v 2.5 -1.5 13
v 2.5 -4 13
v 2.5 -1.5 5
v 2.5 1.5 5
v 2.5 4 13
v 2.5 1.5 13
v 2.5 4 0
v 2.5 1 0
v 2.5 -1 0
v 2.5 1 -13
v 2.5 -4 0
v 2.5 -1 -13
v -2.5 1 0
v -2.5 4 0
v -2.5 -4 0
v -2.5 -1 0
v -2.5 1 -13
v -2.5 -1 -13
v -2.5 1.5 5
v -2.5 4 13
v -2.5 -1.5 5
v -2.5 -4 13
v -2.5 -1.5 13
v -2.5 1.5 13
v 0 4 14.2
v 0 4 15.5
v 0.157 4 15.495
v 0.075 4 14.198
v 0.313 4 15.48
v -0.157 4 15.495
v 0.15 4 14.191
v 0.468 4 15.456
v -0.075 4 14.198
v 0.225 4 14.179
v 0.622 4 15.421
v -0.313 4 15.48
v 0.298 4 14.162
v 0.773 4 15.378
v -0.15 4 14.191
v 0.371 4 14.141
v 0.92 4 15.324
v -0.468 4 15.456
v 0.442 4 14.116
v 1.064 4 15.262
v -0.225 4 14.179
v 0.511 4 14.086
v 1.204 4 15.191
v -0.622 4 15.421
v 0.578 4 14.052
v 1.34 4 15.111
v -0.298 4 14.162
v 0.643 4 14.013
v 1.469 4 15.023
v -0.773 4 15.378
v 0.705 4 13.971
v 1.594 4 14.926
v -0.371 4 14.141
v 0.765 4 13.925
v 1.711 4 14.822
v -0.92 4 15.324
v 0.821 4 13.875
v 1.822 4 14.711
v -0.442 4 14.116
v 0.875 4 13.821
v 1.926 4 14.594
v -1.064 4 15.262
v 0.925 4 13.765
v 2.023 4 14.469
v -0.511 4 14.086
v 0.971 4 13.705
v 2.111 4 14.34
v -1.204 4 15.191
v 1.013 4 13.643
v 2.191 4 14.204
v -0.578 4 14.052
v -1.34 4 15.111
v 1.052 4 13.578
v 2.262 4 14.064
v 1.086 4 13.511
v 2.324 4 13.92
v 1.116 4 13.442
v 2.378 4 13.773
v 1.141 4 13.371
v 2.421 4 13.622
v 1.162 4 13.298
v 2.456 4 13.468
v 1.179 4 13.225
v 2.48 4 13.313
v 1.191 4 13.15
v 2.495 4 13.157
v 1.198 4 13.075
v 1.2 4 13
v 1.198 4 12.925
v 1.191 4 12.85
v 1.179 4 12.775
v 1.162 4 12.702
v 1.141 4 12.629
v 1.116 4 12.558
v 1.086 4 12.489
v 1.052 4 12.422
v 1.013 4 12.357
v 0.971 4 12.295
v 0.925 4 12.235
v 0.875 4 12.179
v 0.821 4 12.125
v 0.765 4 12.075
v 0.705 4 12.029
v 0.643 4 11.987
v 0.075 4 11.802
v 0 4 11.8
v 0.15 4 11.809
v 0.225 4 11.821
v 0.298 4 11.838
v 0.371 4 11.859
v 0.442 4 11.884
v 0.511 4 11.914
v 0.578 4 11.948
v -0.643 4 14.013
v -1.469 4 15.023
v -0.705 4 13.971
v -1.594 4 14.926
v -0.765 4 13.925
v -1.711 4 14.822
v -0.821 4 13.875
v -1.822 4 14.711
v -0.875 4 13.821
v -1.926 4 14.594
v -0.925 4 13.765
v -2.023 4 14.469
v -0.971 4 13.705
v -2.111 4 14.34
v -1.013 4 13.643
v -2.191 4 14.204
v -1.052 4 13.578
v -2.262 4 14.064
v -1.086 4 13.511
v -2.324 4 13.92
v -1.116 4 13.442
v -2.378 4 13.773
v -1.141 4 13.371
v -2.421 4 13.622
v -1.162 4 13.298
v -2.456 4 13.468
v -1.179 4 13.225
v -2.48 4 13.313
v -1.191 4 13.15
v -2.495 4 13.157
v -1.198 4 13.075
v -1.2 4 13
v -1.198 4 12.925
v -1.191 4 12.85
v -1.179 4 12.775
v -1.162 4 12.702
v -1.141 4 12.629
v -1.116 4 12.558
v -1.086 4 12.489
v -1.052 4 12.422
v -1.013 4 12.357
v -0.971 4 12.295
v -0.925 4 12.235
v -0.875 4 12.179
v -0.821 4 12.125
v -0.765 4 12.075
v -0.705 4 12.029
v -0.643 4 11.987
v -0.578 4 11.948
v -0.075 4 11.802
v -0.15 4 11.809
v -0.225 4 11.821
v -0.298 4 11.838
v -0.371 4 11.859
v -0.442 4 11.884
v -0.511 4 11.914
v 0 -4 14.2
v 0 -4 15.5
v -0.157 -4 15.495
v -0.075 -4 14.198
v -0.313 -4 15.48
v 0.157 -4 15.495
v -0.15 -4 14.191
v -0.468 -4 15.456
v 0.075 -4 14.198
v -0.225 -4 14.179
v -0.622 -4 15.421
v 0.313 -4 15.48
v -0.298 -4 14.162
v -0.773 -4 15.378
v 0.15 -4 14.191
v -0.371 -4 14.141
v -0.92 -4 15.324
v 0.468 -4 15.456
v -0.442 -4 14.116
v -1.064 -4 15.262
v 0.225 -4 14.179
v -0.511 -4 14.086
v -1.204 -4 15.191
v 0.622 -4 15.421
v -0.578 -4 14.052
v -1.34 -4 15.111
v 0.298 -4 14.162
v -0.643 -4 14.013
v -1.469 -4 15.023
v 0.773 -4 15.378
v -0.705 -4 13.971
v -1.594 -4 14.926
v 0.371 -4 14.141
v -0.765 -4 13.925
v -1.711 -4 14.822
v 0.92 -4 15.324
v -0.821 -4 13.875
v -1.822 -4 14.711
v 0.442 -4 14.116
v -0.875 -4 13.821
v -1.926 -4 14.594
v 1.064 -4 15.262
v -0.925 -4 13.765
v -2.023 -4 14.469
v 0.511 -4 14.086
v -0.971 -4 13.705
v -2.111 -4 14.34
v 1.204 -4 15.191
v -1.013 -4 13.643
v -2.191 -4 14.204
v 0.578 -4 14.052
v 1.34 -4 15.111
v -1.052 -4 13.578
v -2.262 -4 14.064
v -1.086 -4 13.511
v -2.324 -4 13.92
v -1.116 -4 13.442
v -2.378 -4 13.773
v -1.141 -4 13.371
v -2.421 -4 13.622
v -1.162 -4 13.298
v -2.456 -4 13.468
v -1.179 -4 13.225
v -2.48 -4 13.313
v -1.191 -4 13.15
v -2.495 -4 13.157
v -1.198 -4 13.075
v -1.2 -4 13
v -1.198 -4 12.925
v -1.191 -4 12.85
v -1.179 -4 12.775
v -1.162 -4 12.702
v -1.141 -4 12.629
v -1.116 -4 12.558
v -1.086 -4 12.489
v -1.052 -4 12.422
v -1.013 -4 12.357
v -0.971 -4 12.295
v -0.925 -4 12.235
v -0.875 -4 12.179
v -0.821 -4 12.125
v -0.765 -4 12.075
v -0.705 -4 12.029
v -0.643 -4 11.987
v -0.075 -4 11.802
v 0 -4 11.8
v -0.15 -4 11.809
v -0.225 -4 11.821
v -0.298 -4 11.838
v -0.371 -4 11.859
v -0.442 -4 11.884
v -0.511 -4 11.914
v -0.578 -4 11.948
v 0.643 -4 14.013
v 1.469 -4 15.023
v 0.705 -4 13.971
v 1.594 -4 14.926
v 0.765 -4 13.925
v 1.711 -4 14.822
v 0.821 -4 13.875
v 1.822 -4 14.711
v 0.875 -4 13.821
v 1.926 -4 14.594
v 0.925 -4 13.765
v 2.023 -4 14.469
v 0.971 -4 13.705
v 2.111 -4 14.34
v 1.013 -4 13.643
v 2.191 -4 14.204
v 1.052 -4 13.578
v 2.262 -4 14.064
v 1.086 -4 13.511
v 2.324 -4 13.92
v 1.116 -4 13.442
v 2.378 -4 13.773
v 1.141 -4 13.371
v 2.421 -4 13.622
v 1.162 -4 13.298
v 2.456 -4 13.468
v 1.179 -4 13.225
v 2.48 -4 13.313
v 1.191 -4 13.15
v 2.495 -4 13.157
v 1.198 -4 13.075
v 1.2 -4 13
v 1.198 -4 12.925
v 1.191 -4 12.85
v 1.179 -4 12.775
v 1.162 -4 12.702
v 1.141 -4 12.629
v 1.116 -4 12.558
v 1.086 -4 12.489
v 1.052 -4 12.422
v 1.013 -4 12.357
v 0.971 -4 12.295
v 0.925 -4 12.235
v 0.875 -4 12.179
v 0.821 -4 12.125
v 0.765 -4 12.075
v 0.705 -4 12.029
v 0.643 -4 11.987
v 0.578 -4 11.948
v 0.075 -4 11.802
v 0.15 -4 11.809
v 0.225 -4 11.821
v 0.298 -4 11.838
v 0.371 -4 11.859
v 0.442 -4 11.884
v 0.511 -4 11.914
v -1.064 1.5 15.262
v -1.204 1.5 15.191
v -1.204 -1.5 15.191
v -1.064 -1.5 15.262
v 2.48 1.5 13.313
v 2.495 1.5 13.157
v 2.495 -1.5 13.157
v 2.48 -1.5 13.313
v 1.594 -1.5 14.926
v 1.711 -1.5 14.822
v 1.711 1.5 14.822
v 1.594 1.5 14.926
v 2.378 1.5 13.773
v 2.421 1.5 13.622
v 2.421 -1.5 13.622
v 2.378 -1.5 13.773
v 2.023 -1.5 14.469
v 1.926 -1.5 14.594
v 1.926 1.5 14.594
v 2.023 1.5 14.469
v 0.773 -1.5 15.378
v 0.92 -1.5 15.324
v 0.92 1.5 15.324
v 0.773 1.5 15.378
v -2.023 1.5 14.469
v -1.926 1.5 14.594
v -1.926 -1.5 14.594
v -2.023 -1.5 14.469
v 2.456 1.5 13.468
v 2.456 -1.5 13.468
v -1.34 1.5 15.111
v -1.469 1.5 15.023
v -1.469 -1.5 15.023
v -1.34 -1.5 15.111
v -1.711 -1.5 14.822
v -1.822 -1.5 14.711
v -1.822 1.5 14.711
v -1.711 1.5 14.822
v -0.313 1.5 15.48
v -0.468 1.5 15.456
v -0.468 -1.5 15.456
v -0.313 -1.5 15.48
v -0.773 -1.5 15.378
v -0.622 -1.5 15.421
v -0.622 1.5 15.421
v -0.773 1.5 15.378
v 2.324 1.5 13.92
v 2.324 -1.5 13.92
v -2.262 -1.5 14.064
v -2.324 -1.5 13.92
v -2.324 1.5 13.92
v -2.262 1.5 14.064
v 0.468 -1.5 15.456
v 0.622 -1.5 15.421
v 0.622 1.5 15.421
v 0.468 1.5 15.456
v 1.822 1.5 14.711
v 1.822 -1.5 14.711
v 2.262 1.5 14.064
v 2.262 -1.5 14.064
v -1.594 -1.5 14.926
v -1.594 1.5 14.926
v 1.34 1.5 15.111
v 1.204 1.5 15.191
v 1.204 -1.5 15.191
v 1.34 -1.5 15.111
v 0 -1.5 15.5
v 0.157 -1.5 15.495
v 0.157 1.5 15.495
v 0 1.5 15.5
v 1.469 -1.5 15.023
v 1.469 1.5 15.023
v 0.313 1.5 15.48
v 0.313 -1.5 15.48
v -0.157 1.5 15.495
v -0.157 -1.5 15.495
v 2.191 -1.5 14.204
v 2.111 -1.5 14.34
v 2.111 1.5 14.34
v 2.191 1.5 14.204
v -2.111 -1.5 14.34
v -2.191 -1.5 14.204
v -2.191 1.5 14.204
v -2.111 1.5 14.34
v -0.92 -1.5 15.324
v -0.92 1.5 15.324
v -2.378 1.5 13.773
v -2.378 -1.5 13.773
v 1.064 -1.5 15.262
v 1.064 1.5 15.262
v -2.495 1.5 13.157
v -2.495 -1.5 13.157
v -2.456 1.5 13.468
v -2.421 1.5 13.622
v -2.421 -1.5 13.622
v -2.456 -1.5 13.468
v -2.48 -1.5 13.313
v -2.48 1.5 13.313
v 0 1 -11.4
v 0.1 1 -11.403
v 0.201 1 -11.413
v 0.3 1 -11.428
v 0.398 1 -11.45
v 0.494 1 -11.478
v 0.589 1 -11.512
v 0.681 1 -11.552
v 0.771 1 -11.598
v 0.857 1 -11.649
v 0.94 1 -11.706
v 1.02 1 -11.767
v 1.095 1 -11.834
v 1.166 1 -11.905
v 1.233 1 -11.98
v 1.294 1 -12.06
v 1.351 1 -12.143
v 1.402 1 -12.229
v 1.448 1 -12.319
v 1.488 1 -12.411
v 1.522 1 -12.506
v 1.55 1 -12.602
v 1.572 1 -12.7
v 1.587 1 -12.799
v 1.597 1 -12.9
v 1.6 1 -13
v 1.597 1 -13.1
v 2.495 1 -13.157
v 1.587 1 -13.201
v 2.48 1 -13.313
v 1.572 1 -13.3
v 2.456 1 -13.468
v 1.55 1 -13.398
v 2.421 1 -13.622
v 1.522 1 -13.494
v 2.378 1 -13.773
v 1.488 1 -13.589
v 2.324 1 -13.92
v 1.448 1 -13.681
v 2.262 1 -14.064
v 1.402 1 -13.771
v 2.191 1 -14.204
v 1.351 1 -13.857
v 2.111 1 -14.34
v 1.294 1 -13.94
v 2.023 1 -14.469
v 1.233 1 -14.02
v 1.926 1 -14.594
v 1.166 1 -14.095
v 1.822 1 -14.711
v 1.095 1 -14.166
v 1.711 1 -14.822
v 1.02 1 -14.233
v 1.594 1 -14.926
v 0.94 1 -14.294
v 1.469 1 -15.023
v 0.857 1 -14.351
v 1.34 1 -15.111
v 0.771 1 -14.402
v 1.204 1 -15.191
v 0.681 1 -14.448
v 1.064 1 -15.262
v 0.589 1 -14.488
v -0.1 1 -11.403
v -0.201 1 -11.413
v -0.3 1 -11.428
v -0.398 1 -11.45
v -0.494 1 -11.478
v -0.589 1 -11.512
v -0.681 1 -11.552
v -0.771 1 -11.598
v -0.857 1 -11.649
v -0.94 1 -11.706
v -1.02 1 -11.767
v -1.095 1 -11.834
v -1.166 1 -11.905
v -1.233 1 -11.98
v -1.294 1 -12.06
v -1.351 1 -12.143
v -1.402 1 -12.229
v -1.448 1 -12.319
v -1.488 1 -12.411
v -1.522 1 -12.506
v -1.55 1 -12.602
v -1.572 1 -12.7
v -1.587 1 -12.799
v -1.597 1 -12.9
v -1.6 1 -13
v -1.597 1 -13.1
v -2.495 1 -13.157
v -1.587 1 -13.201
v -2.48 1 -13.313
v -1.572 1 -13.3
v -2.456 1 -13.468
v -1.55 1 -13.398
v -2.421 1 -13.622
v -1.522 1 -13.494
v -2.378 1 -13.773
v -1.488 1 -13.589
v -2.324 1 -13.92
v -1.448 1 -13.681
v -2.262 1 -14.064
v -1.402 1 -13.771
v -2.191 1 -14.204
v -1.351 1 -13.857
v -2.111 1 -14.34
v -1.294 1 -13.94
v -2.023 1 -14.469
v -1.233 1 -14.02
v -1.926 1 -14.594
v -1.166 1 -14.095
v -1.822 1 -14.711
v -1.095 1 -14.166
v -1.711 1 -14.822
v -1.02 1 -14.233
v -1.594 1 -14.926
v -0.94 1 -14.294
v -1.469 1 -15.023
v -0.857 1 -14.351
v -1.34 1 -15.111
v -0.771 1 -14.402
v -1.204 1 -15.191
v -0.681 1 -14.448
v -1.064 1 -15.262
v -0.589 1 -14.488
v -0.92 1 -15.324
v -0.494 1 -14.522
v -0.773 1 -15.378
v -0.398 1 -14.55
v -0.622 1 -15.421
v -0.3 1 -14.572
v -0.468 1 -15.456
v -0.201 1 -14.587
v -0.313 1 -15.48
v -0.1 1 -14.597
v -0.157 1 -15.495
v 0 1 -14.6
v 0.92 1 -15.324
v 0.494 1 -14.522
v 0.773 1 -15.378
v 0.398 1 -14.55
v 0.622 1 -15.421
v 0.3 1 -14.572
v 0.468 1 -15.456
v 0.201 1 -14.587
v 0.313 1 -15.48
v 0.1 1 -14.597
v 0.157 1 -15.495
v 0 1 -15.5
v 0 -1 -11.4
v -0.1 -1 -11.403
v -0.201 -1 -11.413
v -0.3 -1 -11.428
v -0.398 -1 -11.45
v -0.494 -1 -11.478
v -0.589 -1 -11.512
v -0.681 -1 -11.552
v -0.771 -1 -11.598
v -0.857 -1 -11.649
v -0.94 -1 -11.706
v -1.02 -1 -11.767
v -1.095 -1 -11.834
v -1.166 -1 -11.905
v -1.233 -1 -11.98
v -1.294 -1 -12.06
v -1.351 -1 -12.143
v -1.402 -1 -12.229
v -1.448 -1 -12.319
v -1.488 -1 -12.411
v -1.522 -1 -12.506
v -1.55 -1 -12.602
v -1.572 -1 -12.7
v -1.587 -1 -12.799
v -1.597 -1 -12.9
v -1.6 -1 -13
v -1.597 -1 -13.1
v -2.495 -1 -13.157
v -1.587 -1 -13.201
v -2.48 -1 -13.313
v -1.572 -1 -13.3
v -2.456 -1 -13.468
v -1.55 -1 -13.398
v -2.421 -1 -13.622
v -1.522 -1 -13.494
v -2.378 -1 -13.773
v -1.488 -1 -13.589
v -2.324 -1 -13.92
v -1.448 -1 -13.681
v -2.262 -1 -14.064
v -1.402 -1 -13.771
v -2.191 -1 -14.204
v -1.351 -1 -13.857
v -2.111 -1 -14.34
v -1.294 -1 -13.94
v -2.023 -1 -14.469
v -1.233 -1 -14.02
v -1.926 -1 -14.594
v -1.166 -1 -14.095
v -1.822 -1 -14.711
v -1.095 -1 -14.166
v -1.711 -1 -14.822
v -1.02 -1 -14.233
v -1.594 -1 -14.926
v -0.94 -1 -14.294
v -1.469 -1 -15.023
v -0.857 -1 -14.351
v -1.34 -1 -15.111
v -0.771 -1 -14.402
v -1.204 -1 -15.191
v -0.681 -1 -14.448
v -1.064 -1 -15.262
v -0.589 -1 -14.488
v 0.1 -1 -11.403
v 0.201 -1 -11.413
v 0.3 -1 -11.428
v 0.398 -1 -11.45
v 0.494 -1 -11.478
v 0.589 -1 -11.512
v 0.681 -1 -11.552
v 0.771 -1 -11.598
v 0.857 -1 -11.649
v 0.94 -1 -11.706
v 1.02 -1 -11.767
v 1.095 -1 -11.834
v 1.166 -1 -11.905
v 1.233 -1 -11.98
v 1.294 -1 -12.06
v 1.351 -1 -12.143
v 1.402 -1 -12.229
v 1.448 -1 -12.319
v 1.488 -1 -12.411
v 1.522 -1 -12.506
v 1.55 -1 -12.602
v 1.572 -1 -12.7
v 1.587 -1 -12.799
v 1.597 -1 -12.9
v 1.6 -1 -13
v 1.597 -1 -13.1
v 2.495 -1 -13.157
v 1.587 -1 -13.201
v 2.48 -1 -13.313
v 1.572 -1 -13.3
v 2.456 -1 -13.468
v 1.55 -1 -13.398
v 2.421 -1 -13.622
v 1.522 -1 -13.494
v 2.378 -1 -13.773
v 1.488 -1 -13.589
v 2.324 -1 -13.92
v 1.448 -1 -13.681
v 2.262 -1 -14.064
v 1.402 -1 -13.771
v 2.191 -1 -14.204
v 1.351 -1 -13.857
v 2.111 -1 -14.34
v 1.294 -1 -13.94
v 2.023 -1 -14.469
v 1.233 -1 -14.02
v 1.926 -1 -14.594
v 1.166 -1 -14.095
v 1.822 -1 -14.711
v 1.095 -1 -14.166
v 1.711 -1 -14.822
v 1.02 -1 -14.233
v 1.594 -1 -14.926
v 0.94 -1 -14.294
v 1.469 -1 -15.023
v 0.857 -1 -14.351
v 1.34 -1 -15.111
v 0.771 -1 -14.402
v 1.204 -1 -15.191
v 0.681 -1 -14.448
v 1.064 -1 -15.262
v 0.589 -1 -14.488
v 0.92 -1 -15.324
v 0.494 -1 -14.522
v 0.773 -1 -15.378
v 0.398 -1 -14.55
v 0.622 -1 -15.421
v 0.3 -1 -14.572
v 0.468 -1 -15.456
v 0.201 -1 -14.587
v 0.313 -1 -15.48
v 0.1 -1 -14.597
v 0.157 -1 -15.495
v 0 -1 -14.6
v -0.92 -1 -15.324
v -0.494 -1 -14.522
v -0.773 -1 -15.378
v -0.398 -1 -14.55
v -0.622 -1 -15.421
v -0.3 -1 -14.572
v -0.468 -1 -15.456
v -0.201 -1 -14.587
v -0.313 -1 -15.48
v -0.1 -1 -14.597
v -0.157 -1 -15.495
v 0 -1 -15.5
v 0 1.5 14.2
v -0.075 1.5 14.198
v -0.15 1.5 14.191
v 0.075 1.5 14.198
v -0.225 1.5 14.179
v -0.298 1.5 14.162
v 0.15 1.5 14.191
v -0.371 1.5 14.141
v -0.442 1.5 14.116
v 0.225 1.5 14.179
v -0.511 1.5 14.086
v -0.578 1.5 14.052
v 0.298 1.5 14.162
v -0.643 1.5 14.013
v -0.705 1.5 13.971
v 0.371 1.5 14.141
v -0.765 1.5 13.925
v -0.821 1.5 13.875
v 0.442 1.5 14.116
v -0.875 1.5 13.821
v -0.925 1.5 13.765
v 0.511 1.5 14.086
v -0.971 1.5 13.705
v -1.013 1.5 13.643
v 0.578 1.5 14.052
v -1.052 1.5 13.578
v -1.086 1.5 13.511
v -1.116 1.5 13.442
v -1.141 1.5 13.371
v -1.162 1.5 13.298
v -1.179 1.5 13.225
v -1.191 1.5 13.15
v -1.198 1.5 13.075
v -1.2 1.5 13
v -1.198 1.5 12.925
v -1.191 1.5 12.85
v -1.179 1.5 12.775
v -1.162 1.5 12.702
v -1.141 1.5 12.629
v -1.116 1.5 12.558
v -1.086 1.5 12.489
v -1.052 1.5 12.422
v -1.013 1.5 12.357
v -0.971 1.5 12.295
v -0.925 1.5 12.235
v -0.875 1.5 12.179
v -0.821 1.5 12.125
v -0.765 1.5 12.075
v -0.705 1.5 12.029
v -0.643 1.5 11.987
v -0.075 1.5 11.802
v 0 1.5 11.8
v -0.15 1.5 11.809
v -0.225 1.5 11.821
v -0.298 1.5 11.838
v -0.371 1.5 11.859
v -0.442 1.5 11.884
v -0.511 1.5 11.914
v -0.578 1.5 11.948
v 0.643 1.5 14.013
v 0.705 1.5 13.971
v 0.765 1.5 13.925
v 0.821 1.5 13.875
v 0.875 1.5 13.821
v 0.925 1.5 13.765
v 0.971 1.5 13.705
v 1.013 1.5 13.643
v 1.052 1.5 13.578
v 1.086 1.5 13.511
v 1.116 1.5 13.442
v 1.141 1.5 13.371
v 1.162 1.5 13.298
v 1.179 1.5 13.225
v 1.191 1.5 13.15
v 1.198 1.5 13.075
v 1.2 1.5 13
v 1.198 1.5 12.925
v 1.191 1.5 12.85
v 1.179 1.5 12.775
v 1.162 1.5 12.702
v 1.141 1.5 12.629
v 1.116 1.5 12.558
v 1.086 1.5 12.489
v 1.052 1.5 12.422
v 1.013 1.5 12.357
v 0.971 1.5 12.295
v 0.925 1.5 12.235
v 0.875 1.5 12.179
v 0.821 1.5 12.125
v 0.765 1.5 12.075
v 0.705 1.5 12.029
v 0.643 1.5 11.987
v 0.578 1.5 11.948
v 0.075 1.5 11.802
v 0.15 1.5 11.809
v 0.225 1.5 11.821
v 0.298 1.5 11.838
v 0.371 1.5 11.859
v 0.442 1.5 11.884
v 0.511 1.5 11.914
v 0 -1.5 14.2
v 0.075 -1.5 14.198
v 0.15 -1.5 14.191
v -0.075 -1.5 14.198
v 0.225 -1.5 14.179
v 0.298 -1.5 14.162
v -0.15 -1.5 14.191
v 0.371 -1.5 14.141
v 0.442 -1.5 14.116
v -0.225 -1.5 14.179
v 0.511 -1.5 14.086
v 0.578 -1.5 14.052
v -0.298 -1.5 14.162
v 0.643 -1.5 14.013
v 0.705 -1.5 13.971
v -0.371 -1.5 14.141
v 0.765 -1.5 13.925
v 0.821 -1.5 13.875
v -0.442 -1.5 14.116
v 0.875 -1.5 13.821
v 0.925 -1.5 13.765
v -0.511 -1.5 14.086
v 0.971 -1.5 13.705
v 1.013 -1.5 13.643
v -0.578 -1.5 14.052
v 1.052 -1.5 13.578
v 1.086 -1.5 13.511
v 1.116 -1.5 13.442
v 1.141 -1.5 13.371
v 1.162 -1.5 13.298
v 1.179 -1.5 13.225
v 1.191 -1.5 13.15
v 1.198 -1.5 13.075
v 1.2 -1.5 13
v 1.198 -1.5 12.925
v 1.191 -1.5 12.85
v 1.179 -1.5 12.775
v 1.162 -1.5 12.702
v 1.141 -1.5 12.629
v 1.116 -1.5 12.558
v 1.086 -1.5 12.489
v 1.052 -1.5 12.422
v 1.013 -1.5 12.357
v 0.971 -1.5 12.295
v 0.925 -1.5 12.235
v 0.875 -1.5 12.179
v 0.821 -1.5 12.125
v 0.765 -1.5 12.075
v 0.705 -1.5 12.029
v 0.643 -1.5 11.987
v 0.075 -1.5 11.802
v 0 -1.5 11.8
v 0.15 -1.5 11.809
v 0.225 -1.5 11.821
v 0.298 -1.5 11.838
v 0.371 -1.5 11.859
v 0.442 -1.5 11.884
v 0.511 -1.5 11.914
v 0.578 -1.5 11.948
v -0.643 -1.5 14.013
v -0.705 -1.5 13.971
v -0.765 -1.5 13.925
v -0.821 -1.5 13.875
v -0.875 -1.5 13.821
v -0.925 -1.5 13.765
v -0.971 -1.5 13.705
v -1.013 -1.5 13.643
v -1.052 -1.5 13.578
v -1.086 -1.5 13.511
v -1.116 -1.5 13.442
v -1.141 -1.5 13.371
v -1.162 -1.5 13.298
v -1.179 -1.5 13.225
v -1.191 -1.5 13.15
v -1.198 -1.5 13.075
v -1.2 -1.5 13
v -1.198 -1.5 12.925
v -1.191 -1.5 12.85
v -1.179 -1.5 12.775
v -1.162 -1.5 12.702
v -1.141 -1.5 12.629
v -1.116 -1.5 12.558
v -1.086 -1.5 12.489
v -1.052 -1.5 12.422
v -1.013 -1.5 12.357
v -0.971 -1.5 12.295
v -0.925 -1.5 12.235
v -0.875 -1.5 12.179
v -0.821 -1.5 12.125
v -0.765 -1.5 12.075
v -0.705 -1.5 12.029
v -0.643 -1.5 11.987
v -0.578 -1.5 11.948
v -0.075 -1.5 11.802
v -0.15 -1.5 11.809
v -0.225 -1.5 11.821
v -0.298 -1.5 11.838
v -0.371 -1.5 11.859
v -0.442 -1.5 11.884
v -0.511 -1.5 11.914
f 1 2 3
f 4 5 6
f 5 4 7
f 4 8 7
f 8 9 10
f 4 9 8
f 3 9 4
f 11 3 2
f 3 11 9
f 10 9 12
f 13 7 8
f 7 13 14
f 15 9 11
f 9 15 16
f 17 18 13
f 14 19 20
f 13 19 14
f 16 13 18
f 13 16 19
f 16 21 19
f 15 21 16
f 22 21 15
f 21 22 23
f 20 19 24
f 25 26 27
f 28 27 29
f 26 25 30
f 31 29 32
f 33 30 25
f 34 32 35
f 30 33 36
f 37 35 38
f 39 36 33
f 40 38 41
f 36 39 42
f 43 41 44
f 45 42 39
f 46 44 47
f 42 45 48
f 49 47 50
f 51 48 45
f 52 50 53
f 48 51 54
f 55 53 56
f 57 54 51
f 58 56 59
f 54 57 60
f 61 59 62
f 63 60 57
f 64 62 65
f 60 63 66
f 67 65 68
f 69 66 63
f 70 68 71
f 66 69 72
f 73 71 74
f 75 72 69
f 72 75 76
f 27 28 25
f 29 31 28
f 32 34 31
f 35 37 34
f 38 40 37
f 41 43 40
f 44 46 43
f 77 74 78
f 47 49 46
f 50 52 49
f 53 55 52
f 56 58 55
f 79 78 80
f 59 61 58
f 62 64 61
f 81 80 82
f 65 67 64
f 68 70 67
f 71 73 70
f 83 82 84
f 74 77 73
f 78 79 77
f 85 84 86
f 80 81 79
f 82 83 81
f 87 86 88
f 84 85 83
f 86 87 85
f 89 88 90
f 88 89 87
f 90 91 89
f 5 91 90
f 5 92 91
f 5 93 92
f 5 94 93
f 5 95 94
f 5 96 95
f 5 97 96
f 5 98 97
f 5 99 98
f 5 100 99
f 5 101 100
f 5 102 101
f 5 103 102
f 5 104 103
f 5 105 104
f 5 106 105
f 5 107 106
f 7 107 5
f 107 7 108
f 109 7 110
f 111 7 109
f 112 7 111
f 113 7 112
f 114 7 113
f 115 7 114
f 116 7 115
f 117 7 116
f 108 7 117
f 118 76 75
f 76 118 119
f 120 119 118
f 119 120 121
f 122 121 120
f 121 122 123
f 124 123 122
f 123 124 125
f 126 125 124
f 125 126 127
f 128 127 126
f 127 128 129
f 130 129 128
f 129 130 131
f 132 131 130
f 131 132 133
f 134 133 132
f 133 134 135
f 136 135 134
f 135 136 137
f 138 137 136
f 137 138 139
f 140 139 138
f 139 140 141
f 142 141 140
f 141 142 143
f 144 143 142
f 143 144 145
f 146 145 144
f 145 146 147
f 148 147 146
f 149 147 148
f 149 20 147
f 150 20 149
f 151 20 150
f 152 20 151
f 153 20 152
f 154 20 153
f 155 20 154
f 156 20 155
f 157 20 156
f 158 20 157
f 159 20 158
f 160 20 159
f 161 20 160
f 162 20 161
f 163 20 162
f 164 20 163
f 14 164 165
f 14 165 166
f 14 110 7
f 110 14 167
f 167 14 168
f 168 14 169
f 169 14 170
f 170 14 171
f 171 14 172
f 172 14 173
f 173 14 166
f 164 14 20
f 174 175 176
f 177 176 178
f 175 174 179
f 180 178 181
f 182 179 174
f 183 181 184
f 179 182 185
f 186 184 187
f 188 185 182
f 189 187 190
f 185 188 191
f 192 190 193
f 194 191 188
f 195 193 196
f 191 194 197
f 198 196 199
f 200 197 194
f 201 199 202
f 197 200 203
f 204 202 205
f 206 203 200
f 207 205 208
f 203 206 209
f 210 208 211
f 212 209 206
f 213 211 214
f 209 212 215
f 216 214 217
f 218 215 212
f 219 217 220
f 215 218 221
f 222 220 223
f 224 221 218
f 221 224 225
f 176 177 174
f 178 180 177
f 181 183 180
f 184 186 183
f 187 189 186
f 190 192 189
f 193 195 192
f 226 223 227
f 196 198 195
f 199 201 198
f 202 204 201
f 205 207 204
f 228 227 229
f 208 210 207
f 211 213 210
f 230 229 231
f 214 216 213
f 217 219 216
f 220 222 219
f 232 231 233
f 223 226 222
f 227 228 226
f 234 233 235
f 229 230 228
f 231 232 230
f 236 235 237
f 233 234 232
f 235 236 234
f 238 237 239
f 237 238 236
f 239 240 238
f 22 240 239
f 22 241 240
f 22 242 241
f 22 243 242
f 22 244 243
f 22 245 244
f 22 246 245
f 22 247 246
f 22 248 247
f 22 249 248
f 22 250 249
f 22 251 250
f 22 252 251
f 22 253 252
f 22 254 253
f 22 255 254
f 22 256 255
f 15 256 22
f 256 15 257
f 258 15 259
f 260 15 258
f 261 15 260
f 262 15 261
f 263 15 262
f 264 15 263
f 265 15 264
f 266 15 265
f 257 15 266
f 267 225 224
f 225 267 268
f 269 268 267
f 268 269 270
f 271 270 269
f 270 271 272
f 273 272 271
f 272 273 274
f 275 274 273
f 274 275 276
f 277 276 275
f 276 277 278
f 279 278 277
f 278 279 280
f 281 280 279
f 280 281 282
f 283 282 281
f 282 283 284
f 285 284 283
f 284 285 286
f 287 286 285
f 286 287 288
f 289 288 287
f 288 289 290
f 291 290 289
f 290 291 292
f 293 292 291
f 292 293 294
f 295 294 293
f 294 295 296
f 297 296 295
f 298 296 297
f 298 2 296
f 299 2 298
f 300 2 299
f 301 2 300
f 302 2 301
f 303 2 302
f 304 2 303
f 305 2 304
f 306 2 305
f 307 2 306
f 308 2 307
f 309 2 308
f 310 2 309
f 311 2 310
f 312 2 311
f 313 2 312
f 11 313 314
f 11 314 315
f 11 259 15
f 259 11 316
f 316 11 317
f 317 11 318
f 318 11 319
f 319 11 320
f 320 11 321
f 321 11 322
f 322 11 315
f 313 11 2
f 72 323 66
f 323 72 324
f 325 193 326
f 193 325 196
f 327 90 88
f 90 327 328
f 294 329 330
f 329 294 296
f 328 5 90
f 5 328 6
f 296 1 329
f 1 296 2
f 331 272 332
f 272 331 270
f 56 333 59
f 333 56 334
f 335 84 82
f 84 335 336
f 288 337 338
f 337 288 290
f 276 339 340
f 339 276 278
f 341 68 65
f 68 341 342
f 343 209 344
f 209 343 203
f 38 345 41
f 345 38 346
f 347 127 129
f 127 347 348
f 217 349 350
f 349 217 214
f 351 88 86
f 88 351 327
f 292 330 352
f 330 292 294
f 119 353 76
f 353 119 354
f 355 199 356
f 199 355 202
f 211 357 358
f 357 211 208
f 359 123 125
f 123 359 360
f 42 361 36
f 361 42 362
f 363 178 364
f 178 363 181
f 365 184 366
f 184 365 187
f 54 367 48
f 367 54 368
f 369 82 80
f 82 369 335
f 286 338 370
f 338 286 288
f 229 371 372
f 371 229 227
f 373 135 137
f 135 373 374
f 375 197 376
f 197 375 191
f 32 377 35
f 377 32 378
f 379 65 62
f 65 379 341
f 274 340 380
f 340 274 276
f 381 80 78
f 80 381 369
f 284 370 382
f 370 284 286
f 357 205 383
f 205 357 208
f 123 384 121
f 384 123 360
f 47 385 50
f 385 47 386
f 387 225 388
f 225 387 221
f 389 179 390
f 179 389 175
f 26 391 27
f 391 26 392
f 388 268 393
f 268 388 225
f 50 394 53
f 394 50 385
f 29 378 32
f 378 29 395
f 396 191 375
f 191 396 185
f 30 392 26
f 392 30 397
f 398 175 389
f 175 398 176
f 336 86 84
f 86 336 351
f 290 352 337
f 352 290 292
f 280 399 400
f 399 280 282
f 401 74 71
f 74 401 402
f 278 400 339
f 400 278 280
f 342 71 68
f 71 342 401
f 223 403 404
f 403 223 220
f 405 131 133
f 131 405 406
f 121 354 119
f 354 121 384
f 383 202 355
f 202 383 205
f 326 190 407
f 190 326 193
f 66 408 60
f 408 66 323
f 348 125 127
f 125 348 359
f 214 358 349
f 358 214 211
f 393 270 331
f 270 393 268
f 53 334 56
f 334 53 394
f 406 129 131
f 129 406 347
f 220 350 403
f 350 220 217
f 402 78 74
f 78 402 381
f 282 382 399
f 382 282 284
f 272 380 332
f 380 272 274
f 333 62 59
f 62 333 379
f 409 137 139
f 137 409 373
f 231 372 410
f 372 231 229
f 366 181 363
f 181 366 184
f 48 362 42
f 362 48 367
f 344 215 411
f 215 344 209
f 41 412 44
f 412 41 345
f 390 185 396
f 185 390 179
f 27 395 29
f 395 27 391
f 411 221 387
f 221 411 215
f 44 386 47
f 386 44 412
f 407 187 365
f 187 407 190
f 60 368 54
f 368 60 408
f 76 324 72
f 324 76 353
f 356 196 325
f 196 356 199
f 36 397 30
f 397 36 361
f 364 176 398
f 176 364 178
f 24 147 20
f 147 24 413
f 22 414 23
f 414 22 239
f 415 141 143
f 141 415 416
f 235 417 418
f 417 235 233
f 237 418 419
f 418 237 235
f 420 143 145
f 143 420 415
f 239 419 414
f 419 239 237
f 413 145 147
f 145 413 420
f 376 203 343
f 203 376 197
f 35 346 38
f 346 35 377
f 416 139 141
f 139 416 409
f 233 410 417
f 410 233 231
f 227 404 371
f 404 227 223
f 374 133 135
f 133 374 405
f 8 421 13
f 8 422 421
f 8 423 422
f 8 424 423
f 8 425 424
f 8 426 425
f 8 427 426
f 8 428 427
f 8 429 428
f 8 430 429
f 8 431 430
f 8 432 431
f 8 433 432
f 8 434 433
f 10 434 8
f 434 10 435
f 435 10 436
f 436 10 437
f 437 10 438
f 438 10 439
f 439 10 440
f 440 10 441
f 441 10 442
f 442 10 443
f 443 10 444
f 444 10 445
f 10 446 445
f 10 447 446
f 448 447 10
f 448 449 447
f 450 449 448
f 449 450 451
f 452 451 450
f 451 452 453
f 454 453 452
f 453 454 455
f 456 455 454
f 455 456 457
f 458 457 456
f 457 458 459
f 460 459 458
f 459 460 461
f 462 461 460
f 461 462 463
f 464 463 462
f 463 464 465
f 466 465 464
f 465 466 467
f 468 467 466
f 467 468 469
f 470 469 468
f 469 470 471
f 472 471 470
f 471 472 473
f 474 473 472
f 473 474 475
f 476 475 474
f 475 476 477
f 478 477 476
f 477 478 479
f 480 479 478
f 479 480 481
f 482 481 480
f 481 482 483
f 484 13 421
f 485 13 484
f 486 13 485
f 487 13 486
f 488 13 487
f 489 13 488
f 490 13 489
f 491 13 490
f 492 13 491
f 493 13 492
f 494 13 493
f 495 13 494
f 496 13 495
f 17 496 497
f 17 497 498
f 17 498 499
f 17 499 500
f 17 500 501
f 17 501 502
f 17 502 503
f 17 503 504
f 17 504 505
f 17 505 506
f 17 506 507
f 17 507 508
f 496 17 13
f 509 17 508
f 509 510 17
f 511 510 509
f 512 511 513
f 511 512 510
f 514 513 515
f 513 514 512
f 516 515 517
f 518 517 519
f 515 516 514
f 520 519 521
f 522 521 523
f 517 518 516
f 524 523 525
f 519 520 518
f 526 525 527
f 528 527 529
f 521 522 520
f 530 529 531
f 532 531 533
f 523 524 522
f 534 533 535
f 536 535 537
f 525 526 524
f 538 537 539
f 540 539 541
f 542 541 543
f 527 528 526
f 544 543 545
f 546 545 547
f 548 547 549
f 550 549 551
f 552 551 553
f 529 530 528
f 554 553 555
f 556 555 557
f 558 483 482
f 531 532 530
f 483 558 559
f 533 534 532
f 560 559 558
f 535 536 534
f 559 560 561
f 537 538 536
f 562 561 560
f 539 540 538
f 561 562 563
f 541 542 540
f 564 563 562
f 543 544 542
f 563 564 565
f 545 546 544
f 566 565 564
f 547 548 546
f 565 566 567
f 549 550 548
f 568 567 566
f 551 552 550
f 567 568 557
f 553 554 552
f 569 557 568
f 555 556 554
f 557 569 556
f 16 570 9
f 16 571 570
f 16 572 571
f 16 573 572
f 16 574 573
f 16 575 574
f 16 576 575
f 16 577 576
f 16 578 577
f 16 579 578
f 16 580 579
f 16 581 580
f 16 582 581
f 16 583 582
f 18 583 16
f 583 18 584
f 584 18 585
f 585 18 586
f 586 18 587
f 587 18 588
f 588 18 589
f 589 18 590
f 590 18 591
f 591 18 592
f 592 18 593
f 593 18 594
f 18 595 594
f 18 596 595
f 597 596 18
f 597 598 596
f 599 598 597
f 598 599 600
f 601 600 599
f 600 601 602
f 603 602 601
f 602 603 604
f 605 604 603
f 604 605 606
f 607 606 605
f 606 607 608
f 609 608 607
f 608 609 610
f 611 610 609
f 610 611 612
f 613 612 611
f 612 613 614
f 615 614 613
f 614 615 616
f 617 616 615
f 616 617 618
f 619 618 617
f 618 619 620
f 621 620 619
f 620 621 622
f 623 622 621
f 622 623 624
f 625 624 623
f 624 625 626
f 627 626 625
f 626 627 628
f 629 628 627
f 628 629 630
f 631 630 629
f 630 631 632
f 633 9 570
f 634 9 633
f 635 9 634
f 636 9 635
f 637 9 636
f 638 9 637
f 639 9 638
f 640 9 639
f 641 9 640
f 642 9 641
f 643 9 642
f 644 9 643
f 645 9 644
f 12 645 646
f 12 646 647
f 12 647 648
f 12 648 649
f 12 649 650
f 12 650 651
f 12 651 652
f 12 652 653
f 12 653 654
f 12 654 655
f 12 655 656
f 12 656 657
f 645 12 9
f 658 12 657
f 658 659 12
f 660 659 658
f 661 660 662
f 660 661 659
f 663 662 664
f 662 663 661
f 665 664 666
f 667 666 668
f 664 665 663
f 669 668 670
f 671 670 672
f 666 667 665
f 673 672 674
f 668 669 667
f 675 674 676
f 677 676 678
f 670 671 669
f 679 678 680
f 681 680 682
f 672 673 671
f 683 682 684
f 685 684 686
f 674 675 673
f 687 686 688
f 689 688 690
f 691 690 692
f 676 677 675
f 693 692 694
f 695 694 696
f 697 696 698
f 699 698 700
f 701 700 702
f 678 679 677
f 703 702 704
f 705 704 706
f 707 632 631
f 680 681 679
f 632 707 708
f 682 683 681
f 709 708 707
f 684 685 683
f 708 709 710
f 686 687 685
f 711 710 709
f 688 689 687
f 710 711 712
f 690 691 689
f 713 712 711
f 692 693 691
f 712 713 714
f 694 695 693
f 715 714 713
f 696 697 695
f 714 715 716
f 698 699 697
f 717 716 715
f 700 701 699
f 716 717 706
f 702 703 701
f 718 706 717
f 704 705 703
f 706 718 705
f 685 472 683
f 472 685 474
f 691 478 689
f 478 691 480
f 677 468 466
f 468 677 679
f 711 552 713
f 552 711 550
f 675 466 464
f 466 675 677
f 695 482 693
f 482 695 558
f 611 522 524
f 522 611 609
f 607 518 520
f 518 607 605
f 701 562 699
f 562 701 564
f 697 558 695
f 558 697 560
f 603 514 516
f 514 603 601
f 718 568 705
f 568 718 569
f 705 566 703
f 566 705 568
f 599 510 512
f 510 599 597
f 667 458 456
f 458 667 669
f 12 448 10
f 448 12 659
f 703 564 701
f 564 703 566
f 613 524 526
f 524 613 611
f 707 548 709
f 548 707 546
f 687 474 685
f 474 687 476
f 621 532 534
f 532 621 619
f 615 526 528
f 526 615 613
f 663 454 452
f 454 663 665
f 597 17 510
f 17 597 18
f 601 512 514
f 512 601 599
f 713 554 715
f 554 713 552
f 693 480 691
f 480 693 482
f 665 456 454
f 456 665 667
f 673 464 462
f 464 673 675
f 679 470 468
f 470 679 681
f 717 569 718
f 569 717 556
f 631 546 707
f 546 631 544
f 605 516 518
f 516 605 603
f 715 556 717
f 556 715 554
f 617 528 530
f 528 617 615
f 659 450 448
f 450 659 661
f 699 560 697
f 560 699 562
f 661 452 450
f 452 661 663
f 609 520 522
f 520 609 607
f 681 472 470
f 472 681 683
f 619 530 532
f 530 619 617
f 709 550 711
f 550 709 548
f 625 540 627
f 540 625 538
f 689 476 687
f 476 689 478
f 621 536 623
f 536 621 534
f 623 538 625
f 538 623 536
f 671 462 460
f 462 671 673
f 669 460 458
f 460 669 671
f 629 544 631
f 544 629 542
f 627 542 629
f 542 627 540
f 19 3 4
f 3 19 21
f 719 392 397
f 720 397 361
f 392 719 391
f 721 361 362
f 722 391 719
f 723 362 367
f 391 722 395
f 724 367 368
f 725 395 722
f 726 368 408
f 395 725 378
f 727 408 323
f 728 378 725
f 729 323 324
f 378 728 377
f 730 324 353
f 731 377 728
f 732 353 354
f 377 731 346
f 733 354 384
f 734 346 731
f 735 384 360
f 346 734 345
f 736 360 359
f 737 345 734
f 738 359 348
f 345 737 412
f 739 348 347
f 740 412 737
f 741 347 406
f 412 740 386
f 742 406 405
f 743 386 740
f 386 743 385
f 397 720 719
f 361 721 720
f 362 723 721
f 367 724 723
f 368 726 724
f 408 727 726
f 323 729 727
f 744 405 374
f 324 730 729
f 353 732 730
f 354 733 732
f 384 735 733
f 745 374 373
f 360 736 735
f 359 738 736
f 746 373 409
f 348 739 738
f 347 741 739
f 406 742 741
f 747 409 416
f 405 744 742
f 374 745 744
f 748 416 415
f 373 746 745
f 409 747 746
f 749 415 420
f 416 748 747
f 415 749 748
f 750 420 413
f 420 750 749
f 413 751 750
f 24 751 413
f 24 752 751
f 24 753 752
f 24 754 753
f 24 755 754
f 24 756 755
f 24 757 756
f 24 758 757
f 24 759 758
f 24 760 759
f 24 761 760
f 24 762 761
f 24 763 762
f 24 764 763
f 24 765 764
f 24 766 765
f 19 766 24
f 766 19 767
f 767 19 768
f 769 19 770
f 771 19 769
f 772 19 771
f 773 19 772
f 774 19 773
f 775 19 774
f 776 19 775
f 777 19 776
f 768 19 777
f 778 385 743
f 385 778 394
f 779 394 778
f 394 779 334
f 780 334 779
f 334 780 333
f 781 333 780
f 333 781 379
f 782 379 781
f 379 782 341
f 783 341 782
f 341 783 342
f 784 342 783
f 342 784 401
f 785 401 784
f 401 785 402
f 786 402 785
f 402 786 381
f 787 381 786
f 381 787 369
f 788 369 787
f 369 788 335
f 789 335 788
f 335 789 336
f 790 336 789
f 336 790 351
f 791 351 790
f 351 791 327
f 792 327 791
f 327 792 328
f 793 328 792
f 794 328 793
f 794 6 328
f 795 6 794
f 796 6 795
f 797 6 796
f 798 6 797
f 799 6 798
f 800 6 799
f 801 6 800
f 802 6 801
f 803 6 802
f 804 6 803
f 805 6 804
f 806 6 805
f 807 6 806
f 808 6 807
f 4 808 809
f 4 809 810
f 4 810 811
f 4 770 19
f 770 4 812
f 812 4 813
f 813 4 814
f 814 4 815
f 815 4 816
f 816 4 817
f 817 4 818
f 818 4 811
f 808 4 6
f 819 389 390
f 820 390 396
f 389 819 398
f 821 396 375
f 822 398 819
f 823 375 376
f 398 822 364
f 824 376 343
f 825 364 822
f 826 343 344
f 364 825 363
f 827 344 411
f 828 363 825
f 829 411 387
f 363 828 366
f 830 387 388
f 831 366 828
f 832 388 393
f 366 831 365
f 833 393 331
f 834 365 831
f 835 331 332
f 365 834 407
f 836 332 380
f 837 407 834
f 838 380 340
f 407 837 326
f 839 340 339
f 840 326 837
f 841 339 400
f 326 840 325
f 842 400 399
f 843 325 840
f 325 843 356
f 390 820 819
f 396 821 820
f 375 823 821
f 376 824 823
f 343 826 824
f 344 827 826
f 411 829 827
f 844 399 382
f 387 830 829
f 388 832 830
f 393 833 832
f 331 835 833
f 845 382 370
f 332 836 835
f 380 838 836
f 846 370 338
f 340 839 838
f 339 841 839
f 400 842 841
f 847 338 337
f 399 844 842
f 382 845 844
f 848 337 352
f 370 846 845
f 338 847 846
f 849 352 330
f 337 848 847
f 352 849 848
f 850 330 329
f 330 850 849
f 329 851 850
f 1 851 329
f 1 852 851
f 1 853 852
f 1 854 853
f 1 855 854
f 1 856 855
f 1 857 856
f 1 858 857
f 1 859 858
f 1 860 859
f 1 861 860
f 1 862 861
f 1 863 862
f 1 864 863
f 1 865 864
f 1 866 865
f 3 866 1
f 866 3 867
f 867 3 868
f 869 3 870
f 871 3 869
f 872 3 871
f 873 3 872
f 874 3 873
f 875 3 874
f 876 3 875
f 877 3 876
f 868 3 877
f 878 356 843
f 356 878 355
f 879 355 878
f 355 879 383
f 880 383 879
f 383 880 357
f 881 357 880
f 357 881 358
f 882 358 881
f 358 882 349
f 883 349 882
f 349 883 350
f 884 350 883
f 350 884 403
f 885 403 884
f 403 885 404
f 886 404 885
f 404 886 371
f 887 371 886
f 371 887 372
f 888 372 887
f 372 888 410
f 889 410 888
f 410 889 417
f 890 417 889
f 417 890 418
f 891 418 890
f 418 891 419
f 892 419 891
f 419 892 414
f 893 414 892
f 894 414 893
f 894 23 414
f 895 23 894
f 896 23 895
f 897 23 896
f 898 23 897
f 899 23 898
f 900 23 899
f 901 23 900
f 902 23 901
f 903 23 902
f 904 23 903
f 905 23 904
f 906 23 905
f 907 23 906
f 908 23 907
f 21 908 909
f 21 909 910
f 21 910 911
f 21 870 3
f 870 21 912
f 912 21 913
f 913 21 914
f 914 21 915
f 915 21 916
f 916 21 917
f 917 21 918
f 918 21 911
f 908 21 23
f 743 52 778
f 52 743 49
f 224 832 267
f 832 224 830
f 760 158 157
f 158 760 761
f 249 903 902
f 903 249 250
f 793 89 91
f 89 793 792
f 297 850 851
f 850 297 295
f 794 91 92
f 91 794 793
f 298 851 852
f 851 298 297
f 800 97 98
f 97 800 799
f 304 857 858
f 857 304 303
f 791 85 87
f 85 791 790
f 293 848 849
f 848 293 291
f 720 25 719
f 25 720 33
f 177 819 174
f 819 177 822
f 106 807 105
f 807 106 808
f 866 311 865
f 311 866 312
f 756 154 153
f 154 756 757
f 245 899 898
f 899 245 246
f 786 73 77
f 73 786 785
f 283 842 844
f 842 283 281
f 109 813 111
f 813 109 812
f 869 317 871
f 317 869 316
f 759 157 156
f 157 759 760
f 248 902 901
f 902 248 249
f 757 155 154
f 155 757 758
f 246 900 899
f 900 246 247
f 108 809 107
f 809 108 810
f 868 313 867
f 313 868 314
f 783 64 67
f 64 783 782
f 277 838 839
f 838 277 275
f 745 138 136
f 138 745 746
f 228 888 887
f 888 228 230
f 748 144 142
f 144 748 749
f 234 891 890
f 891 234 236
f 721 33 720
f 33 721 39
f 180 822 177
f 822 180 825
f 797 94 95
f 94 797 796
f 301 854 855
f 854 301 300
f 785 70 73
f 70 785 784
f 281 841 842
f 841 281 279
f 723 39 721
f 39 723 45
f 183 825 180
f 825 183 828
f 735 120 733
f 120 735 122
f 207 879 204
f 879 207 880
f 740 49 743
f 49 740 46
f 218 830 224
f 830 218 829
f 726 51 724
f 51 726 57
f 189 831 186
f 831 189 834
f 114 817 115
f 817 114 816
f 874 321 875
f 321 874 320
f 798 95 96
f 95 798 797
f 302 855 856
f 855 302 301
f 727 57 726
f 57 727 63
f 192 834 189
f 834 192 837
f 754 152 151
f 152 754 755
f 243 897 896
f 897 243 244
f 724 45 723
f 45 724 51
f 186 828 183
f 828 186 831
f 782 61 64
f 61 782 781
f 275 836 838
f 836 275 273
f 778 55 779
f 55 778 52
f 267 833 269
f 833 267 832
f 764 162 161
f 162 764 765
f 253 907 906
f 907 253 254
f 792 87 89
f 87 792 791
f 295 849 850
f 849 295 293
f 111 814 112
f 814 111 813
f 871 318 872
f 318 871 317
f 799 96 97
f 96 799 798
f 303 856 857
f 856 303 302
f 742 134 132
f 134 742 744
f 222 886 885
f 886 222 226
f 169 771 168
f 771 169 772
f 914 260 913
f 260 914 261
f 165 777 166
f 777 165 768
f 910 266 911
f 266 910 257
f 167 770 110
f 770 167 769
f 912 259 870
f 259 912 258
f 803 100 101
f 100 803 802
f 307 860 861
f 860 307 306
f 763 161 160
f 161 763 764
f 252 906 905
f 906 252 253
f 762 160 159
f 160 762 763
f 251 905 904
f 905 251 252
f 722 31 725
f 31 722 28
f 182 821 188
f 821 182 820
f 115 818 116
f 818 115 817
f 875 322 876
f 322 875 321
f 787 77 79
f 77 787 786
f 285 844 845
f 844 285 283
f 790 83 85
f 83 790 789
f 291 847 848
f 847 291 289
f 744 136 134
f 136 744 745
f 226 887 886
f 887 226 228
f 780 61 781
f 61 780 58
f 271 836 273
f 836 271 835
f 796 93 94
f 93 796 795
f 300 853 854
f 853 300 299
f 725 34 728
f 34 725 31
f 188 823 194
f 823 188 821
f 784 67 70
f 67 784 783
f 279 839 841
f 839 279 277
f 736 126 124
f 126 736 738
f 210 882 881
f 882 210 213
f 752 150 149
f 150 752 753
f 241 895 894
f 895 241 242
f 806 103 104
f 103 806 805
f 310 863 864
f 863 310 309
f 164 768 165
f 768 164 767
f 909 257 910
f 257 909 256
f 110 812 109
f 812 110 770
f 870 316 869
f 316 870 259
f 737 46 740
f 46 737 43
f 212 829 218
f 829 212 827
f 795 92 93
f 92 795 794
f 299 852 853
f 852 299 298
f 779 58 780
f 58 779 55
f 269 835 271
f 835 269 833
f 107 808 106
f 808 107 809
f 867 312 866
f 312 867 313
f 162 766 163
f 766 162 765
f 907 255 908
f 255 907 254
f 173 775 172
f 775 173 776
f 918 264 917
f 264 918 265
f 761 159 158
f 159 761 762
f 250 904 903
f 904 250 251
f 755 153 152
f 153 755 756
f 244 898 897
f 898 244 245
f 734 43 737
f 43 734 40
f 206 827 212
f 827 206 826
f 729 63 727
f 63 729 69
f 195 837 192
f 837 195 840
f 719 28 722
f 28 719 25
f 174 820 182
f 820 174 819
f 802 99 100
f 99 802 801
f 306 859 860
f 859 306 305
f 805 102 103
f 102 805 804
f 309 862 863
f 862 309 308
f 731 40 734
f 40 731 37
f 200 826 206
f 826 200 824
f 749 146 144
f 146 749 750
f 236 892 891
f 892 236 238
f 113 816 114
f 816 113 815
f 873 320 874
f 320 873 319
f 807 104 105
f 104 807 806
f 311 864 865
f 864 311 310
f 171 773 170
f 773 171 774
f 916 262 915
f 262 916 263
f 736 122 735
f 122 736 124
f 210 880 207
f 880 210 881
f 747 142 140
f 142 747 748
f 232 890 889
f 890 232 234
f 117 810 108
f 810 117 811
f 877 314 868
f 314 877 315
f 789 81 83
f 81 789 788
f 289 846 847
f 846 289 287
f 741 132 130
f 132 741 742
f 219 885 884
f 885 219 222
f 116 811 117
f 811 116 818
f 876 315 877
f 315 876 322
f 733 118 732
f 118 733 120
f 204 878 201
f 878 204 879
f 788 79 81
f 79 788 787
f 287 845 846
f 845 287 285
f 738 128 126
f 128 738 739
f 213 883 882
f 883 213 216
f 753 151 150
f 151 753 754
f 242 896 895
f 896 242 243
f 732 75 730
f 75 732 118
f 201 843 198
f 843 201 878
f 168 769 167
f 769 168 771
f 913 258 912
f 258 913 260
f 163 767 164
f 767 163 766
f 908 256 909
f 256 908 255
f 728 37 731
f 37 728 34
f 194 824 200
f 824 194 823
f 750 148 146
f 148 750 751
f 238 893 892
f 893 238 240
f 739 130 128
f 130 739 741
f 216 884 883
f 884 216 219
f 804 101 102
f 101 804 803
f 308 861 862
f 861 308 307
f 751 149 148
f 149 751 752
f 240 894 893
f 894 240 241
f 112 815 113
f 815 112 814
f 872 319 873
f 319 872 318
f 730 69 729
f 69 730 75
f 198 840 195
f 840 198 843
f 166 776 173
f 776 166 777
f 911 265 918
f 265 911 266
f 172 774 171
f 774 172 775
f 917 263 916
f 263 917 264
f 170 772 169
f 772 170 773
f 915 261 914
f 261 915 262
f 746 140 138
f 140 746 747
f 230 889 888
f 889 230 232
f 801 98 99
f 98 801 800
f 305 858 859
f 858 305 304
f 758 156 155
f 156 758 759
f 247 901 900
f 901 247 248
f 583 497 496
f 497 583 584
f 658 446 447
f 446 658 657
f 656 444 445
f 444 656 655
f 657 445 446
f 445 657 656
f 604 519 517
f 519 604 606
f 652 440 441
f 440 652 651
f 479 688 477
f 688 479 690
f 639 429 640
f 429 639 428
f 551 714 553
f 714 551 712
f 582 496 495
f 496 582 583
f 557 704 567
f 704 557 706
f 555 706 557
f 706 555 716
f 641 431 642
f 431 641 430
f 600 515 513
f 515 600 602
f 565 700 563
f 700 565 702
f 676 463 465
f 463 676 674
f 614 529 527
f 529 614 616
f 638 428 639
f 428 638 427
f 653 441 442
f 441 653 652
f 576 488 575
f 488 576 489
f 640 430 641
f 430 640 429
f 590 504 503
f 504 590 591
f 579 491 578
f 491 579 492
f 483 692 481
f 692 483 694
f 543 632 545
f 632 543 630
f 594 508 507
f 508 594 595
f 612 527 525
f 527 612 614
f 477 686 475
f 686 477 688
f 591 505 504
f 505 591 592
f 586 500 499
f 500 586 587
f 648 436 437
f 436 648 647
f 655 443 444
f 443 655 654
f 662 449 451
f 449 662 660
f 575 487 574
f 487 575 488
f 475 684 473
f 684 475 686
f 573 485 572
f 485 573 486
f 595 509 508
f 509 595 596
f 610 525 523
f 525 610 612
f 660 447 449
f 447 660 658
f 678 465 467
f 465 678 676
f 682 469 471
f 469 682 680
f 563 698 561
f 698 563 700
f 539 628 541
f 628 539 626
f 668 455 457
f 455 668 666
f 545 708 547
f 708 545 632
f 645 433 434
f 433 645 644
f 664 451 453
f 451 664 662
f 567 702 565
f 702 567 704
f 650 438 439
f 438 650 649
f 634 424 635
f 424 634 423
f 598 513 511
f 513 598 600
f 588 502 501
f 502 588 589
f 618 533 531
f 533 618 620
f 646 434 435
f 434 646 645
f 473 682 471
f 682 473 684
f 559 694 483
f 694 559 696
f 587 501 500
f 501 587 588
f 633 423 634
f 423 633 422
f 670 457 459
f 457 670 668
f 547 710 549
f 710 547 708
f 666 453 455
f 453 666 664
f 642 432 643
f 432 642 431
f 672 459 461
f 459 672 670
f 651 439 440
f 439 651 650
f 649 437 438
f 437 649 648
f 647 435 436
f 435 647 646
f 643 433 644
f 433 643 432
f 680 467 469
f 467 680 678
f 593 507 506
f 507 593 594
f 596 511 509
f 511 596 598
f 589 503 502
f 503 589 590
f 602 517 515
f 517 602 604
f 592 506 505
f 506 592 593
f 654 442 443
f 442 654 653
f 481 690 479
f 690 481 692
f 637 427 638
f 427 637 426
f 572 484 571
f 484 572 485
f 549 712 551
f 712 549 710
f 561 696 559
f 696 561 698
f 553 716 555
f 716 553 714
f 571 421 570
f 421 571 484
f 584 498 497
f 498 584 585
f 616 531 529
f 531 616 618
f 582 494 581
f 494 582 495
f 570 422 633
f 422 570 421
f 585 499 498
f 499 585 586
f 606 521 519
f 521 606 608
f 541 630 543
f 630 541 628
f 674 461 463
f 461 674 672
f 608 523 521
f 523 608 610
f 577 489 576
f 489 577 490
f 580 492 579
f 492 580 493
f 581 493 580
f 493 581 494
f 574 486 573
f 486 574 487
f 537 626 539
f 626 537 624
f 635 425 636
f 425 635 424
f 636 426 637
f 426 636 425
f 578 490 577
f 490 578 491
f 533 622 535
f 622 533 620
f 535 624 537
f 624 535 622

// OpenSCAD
difference(){
	union(){



        translate([-2.5,-4,0]){
           cube([5,8,13], center=false);
        }        

        translate([0,4,13]){
            rotate([90,0,0]){
                cylinder(h=8, r=2.5, $fn=100, center=false);
            }
        }


        translate([-2.5,-1,13-26]){
           cube([5,2,43], center=false);
        }        

        translate([0,1,13-26]){
            rotate([90,0,0]){
                cylinder(h=2, r=2.5, $fn=100, center=false);
            }
        }

        
	}
	union() {

        translate([-5,-1.5,5]){
           cube([10,3,40], center=false);
        }        



        translate([0,30,13]){
            rotate([90,0,0]){
                cylinder(h=50, r=1.2, $fn=100, center=false);
            }
        }


        translate([0,30,13-26]){
            rotate([90,0,0]){
                cylinder(h=50, r=1.6, $fn=100, center=false);
            }
        }


	}
}
